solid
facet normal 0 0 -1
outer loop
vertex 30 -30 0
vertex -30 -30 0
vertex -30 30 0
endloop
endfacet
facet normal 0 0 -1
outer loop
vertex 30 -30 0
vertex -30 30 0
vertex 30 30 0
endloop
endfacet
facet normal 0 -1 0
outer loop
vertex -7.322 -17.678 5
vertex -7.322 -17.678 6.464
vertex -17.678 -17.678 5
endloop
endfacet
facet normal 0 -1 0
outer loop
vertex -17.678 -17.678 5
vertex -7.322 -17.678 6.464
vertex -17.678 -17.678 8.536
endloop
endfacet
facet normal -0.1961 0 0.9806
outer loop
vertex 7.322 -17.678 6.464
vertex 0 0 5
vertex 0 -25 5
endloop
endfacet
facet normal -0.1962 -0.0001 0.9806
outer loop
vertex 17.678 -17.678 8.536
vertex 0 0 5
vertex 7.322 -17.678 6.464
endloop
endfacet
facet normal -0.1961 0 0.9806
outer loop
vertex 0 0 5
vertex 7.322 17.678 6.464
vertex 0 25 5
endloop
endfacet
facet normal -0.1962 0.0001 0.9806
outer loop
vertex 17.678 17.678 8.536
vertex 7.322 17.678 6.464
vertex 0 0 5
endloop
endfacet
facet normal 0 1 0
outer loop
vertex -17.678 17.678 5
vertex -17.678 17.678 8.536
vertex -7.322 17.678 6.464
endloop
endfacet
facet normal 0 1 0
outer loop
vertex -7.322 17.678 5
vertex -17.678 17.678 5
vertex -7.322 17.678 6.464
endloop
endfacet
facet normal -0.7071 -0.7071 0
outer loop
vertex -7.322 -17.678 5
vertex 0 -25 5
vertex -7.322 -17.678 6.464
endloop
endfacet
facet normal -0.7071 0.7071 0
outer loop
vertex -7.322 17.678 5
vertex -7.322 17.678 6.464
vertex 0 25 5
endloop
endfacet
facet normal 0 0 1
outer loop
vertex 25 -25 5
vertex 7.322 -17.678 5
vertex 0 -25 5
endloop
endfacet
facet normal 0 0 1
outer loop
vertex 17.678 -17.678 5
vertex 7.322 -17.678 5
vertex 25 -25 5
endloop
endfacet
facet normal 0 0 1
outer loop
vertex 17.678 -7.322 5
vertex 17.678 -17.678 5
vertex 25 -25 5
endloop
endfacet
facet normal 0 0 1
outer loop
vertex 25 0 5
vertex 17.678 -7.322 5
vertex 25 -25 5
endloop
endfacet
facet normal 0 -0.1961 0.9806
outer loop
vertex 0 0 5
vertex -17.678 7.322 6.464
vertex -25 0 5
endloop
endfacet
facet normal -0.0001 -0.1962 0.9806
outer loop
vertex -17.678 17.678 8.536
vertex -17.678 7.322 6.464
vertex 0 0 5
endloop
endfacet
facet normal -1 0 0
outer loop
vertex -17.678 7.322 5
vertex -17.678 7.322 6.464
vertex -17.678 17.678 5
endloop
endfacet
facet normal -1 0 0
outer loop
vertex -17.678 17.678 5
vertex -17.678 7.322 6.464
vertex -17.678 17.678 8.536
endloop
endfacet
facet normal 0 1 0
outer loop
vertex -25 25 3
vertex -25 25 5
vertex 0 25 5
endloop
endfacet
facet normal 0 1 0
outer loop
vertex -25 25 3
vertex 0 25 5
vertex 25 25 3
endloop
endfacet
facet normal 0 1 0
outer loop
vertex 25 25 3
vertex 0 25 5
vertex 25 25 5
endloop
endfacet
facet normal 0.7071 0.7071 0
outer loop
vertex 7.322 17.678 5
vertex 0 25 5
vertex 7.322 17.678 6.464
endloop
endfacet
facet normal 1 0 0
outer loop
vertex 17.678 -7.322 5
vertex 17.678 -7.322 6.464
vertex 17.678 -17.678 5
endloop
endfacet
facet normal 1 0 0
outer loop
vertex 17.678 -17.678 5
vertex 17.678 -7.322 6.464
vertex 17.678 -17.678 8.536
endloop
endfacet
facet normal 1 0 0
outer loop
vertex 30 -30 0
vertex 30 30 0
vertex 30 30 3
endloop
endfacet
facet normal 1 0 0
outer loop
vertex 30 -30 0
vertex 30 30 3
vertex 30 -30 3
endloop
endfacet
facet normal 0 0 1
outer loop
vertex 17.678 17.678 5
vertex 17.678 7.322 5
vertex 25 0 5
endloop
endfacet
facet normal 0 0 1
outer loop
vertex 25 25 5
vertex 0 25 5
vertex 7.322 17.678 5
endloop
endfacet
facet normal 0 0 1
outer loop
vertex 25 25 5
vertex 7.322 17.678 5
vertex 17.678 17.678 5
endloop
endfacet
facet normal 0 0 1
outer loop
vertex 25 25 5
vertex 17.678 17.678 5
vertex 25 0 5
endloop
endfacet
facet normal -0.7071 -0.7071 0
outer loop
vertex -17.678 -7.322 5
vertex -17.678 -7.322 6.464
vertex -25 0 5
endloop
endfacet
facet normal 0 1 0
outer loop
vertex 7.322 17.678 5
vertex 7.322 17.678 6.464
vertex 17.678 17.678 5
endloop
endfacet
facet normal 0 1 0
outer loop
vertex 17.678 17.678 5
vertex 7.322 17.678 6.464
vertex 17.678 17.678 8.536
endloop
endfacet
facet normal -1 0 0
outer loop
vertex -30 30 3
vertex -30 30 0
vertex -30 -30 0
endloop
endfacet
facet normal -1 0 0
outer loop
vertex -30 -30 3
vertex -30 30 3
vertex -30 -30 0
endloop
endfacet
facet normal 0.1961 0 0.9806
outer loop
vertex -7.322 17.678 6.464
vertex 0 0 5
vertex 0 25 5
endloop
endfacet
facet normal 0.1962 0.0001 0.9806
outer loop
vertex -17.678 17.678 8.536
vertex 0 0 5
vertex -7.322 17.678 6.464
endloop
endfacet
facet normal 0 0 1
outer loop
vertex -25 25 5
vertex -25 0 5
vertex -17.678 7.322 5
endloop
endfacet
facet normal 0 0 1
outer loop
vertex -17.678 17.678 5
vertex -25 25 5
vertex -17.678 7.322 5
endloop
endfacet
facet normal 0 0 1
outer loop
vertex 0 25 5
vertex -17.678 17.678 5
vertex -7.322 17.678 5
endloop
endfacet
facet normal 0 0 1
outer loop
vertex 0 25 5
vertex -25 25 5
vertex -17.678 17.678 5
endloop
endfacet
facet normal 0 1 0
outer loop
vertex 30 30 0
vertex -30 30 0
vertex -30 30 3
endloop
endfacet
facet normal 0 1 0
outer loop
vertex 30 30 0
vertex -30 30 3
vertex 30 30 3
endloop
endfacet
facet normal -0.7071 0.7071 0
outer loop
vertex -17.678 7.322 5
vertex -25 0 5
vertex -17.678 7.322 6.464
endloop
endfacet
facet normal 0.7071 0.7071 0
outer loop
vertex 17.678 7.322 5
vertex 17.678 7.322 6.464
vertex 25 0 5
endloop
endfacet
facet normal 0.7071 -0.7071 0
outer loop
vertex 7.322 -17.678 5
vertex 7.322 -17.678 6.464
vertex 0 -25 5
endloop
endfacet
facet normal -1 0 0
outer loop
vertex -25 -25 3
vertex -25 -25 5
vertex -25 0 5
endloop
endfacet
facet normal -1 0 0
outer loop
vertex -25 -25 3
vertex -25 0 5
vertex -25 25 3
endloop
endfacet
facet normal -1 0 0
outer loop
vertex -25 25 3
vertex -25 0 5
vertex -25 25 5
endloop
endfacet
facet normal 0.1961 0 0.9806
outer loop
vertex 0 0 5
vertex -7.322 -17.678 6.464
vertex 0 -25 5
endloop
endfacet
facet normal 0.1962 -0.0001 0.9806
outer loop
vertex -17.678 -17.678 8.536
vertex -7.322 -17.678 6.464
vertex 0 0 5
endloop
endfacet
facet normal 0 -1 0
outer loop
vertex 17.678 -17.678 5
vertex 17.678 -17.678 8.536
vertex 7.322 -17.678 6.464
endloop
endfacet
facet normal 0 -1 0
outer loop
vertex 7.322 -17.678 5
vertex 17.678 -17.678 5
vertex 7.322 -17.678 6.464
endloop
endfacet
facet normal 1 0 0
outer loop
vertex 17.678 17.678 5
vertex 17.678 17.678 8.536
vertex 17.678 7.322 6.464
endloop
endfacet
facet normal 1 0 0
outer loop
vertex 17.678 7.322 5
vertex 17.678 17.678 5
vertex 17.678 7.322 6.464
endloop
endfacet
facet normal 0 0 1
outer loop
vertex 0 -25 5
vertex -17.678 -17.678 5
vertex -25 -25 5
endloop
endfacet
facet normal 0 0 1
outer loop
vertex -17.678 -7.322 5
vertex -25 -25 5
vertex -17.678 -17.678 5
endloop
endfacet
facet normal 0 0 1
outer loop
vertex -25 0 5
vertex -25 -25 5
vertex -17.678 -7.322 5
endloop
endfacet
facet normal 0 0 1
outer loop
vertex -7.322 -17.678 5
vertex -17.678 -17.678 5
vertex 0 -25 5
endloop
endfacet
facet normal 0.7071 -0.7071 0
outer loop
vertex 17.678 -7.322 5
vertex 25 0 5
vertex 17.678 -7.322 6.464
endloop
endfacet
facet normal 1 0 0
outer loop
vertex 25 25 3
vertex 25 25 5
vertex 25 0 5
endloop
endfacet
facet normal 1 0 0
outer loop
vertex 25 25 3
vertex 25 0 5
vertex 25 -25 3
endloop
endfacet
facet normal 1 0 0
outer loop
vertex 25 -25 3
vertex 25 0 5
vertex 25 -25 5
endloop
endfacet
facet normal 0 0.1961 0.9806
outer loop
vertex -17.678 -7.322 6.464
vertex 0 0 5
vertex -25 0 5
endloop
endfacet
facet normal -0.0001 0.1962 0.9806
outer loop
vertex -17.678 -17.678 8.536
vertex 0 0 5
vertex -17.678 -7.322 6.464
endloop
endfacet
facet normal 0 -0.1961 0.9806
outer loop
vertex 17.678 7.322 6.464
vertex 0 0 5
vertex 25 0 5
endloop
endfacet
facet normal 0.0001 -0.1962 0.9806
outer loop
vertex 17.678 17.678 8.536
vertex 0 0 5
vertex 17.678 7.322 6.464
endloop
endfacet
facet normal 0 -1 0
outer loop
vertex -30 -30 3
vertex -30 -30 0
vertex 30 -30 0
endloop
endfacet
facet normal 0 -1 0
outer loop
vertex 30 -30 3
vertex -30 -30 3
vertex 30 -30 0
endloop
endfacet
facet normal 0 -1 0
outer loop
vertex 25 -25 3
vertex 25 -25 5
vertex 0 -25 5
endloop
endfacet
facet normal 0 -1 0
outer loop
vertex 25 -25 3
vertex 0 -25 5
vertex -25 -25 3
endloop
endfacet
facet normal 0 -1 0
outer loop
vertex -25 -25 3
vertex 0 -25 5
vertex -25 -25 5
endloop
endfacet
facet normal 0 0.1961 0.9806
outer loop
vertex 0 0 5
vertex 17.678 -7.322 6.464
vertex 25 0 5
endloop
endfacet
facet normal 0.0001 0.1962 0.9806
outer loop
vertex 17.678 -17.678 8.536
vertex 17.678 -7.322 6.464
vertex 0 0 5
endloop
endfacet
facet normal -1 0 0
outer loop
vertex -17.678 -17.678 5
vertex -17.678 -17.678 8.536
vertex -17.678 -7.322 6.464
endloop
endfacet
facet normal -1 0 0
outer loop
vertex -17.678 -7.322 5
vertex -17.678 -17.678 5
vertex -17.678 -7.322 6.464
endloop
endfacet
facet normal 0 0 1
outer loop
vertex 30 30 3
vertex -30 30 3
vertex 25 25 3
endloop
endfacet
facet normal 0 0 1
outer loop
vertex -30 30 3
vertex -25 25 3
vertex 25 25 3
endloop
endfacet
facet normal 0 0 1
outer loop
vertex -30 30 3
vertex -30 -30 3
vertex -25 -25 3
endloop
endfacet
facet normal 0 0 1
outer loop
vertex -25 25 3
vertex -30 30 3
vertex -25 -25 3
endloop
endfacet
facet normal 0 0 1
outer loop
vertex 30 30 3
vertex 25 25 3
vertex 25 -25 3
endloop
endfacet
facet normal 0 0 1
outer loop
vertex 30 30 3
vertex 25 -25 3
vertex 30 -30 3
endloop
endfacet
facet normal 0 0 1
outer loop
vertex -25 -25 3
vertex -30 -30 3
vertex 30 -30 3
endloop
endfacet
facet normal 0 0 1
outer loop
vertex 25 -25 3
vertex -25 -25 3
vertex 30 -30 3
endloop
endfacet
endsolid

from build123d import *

# Parameters (mm, degrees)
F1_DEPTH = 10
F2_SIZE2 = 24.99999
F2_SIZE  = 4.99999
F4_COUNT = 4
F5_W     = 60
F5_H     = 60
F5_W_2   = 50
F5_H_2   = 50
F6_DEPTH = 15
F8_DEPTH = 10
F9_DEPTH = 12


# Not quite as in the source:
# - a fillet or chamfer is up to 0.001 mm smaller than in the source, because OpenCascade refuses the exact size


with BuildPart() as f1:
    # F0 (on Top) → F1 (new body)
    with BuildSketch(Plane.XY):
        Polygon((-25, 0), (0, 0), (-25, 25), align=None)
        Polygon((-25, 25), (0, 0), (0, 25), align=None)
    extrude(amount=F1_DEPTH)

    # F2 (size 5 and 25 in the source; OpenCascade refuses exactly that, so slightly less here)
    f2_edges = [f1.edges().sort_by_distance(p)[0] for p in [
        (-12.5, 0, 10),
        (0, 12.5, 10),
    ]]
    chamfer(f2_edges, length=F2_SIZE, length2=F2_SIZE2)


with BuildPart() as f4_1:
    # F4: instance of F1
    add(f1.part.rotate(Axis((0, 0, -0.4458203912), (0, 0, -1)), 1 * 360 / F4_COUNT))


with BuildPart() as f4_2:
    # F4: instance of F1
    add(f1.part.rotate(Axis((0, 0, -0.4458203912), (0, 0, -1)), 2 * 360 / F4_COUNT))


with BuildPart() as f4_3:
    # F4: instance of F1
    add(f1.part.rotate(Axis((0, 0, -0.4458203912), (0, 0, -1)), 3 * 360 / F4_COUNT))


with BuildPart() as f1_1:
    add(f1.part)

    add(f4_1.part)  # F6 merges F4_1

    add(f4_2.part)  # F6 merges F4_2

    add(f4_3.part)  # F6 merges F4_3
    # F5 (on face) → F6 (join)
    with BuildSketch(Plane(origin=(0, 0, 0), x_dir=(1, 0, 0), z_dir=(0, 0, -1))):
        Rectangle(F5_W, F5_H)
        Rectangle(F5_W_2, F5_H_2, mode=Mode.SUBTRACT)
    extrude(amount=-F6_DEPTH)

    # F7 (on face) → F8 (cut)
    with BuildSketch(Plane.XY.offset(15)):
        Polygon((25, 25), (0, 25), (7.3223304703, 17.6776695297), (17.6776695297, 17.6776695297), (17.6776695297, 7.3223304703), (25, 0), align=None)
        Polygon((-7.3223304703, 17.6776695297), (0, 25), (-25, 25), (-25, 0), (-17.6776695297, 7.3223304703), (-17.6776695297, 17.6776695297), align=None)
        Polygon((-17.6776695297, -7.3223304703), (-25, 0), (-25, -25), (0, -25), (-7.3223304703, -17.6776695297), (-17.6776695297, -17.6776695297), align=None)
        Polygon((25, -25), (25, 0), (17.6776695297, -7.3223304703), (17.6776695297, -17.6776695297), (7.3223304703, -17.6776695297), (0, -25), align=None)
    extrude(amount=-F8_DEPTH, mode=Mode.SUBTRACT)

    # F9 (cut): a face of the model
    f9_faces = [f1_1.faces().sort_by_distance(p)[0] for p in [
        (0, 29.1514718626, 15),
    ]]
    extrude(f9_faces, amount=-F9_DEPTH, mode=Mode.SUBTRACT)


solid = f1_1.part
